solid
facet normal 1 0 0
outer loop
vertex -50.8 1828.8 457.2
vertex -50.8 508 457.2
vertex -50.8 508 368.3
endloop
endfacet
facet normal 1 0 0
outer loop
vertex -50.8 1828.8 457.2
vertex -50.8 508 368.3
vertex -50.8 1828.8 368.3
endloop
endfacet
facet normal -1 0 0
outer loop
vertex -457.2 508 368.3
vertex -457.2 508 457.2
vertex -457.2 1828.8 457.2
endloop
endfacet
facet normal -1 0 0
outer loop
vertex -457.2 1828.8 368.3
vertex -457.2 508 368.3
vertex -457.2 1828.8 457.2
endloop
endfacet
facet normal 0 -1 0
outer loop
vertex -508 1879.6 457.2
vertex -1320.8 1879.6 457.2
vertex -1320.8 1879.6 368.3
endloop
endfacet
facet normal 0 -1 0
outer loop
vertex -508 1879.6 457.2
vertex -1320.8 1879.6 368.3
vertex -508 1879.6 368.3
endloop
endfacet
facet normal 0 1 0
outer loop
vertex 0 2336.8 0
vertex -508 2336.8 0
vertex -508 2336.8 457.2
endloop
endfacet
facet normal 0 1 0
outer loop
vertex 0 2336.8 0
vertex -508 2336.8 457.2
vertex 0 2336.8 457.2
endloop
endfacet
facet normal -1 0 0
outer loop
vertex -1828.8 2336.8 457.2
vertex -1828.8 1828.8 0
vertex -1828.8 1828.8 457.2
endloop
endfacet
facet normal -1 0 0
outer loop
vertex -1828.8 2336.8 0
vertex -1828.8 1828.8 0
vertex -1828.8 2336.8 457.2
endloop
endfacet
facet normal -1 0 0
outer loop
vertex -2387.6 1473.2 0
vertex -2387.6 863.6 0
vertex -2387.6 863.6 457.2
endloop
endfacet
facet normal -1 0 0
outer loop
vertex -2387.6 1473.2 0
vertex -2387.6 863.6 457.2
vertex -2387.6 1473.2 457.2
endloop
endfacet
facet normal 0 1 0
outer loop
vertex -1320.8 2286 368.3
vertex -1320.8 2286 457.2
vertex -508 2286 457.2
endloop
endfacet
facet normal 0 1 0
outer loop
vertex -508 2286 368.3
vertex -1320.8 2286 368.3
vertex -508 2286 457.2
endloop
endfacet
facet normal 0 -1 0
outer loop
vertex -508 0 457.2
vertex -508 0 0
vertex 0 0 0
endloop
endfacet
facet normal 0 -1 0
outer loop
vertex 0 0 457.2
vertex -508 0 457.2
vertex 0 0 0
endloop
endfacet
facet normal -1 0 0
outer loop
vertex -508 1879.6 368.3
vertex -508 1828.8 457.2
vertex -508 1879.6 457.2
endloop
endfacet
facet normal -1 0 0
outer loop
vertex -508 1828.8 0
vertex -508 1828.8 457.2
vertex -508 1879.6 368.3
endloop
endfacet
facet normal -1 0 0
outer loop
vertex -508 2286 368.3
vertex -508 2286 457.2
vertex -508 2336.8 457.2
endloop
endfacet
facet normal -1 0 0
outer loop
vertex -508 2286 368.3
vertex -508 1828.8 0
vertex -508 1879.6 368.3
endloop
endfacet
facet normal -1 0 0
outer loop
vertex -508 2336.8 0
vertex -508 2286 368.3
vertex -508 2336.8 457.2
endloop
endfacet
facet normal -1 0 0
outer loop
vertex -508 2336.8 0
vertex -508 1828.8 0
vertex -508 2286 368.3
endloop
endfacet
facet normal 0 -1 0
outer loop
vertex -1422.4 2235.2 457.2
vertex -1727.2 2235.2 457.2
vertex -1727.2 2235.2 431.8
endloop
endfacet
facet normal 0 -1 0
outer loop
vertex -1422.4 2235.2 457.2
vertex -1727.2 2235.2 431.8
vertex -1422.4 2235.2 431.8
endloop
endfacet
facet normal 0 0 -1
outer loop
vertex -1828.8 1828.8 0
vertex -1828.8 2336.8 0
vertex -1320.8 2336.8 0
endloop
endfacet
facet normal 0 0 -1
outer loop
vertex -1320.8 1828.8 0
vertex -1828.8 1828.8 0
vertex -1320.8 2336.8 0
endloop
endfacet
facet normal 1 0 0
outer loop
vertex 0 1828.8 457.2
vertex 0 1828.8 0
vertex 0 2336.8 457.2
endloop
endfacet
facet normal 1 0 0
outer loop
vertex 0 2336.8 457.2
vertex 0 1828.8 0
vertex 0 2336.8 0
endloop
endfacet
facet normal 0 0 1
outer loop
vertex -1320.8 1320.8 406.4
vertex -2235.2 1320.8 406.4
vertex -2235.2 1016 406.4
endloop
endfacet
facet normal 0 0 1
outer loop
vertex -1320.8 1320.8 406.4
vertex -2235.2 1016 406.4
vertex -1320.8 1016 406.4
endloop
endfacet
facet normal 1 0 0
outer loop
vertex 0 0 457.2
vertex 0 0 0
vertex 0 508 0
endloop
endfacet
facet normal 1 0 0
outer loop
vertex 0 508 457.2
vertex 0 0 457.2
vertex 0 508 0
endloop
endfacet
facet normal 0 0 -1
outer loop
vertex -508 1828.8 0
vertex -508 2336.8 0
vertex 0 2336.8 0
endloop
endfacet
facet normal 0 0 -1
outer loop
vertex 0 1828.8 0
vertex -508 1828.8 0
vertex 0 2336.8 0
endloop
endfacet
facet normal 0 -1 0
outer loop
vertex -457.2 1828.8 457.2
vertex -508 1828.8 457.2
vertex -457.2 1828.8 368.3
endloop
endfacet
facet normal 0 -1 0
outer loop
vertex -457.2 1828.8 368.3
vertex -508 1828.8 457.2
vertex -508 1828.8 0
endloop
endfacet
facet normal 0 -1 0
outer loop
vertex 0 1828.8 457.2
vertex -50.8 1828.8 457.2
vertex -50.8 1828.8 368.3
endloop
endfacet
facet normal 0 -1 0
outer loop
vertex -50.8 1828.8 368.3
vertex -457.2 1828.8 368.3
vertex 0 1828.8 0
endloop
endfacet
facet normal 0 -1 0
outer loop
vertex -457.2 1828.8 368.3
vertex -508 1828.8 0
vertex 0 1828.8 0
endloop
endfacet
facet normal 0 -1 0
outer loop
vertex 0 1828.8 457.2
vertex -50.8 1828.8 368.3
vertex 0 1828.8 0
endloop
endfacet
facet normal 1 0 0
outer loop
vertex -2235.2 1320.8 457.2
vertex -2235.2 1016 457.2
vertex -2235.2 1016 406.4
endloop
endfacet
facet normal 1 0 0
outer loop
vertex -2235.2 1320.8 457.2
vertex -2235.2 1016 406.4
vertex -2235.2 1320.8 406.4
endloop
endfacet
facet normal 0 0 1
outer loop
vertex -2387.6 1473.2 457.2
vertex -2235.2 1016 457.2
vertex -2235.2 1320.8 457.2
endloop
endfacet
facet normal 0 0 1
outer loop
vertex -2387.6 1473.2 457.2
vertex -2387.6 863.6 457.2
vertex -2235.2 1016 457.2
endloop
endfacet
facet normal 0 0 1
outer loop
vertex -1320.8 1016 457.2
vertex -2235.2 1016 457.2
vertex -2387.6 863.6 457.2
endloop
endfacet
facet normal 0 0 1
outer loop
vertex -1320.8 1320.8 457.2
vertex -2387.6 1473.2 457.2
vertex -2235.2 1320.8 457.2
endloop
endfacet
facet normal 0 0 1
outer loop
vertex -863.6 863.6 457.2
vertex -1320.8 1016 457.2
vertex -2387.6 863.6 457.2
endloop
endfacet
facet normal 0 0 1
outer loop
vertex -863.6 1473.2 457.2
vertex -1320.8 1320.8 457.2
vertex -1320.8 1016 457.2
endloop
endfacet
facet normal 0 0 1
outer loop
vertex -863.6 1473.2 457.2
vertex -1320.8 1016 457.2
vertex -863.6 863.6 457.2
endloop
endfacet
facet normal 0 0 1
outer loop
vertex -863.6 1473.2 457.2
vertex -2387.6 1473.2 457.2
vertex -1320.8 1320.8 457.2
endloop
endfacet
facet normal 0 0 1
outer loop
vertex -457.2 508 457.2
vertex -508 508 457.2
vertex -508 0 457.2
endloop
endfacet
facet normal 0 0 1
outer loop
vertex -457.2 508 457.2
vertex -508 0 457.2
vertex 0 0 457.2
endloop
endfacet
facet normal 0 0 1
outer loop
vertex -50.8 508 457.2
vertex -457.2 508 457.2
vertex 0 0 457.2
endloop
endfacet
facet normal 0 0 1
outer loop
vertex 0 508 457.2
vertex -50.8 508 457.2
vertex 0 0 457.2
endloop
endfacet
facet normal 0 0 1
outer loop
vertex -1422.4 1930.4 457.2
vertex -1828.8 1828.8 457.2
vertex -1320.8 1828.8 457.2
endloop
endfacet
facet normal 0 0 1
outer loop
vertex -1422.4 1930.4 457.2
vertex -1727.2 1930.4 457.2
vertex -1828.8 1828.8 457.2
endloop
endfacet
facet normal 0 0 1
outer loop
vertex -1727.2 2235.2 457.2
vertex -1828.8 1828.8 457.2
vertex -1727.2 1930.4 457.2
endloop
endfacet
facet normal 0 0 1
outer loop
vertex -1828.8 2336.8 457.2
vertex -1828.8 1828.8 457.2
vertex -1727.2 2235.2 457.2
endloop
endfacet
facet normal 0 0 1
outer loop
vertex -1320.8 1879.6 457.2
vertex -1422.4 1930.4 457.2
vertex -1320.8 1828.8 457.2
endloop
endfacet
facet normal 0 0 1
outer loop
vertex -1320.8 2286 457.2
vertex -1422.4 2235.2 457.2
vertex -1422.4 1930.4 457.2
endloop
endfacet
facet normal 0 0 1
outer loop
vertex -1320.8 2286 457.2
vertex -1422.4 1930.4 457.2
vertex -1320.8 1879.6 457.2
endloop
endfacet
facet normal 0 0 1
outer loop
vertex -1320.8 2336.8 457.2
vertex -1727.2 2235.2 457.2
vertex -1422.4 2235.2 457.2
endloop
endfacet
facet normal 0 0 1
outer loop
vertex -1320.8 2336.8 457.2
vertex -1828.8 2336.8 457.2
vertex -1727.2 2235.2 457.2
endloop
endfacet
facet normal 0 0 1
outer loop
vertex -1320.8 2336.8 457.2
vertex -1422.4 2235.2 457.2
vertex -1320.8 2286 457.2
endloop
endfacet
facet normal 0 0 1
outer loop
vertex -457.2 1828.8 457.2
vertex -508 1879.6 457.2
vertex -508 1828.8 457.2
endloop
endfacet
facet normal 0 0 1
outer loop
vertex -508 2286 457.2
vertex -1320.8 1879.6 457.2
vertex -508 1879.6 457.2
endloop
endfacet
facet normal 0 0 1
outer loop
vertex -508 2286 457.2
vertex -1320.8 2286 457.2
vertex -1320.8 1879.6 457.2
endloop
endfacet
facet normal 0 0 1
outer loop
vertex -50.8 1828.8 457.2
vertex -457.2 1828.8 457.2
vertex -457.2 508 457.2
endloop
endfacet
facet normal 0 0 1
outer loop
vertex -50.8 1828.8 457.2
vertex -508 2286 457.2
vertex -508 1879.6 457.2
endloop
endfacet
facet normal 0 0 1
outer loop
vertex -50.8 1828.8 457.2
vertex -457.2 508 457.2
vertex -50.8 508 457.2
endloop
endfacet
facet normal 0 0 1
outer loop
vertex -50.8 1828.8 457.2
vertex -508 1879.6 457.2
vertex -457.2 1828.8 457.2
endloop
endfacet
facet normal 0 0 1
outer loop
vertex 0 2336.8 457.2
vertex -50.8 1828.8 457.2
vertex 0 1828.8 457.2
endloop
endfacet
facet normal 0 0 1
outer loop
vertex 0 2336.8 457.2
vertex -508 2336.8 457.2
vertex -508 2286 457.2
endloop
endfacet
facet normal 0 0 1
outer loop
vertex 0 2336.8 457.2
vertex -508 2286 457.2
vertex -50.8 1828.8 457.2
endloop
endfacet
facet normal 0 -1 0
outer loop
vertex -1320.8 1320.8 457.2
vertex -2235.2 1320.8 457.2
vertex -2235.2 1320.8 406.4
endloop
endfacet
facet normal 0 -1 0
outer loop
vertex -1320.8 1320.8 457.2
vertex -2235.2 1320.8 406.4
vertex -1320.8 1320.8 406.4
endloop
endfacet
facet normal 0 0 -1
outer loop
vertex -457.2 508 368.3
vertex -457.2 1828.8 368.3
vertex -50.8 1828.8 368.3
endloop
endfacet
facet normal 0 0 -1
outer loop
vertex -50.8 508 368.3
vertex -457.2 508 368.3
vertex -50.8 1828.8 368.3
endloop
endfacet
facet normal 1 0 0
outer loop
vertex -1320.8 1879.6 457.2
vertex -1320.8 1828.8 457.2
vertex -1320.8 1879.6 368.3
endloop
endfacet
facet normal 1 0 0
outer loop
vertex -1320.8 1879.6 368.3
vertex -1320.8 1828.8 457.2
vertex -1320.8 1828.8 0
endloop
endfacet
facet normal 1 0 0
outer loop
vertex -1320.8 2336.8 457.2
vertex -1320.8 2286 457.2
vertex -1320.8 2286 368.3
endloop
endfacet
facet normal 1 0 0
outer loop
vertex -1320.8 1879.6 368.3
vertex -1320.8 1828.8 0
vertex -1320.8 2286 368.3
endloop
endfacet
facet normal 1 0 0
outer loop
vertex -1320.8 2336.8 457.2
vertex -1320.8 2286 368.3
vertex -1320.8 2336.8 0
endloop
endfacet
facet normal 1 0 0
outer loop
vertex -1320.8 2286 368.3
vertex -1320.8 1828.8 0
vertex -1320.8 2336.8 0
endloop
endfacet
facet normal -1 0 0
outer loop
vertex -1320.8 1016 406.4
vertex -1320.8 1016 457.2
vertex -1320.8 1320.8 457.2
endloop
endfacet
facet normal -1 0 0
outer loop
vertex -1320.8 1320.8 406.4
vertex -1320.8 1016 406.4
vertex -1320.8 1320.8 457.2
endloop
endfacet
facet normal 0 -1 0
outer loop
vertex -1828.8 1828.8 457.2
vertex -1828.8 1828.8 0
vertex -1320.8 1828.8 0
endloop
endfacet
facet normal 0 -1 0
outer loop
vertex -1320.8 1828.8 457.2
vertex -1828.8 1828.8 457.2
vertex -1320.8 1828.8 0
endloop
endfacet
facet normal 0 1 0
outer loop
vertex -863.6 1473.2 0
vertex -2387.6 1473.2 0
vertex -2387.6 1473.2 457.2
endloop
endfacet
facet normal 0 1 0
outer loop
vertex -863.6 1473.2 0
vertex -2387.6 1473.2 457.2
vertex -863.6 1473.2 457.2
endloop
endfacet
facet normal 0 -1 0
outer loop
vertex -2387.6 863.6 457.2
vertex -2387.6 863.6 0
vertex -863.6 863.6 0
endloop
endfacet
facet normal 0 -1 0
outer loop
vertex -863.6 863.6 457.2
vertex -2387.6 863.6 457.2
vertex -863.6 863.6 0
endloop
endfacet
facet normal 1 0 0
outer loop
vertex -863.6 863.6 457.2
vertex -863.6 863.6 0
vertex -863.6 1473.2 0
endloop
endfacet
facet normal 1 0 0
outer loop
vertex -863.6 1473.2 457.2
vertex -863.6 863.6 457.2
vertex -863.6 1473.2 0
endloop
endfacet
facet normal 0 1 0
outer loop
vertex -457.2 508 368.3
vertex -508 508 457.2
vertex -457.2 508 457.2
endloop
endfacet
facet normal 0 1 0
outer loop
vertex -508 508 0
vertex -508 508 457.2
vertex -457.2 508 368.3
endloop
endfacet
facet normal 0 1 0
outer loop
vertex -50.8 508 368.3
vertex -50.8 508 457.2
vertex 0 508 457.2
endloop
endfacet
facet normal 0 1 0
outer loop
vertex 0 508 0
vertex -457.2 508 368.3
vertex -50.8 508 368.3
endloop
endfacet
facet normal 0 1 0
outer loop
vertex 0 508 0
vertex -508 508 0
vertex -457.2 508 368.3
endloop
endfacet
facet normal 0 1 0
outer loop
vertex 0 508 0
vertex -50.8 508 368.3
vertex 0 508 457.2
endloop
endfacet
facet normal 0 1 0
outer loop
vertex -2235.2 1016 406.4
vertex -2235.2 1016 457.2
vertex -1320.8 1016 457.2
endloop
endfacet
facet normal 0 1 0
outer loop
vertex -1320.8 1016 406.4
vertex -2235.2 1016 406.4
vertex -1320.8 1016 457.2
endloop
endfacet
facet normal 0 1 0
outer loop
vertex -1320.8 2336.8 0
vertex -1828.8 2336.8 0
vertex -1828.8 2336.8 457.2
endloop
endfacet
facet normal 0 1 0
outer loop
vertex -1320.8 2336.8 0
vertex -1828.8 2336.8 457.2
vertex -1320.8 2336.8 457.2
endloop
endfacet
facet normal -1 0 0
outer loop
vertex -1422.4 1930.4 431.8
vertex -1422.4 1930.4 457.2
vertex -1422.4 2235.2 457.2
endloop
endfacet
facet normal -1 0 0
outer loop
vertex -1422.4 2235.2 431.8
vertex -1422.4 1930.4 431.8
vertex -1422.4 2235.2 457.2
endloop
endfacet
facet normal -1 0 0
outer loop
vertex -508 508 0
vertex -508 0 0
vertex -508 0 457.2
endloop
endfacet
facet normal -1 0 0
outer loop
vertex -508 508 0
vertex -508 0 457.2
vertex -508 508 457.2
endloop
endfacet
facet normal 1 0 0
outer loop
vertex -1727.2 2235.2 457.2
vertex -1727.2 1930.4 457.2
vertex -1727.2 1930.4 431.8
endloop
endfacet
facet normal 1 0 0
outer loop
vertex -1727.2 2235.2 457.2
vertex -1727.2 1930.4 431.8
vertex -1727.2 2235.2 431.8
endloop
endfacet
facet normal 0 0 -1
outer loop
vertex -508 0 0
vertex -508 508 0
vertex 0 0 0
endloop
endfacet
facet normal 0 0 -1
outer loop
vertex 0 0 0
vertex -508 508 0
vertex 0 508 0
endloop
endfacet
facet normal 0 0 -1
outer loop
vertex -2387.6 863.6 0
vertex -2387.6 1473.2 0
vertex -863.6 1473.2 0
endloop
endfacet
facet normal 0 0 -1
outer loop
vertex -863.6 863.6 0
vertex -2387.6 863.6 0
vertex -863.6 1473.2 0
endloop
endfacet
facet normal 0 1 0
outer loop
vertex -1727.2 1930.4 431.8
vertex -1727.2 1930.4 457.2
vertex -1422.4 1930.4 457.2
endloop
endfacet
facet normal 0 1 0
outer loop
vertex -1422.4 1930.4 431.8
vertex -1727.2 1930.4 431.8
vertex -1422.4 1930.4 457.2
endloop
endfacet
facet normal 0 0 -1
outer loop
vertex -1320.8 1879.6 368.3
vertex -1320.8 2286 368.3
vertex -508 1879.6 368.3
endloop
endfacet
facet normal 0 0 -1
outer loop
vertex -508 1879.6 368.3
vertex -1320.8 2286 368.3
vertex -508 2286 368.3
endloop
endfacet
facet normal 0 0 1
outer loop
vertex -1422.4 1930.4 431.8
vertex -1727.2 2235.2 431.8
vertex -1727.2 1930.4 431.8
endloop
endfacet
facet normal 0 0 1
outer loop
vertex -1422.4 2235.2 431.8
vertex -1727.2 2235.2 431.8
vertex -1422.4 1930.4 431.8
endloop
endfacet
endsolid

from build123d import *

# Parameters (mm, degrees)
F0_W     = 508
F0_H     = 508
F0_W_2   = 1524
F0_H_2   = 609.6
F1_DEPTH = 457.2
F2_W     = 406.4
F2_H     = 1371.6
F2_W_2   = 914.4
F2_H_2   = 406.4
F3_DEPTH = 88.9
F2_W_3   = 304.8
F2_H_3   = 304.8
F4_DEPTH = 25.4
F5_DEPTH = 50.8


with BuildPart() as f1:
    # F0 (on Top) → F1 (new body)
    with BuildSketch(Plane.XY):
        with Locations((-254, 254)):
            Rectangle(F0_W, F0_H)
        with Locations((-254, 2082.8)):
            Rectangle(F0_W, F0_H)
        with Locations((-1574.8, 2082.8)):
            Rectangle(F0_W, F0_H)
        with Locations((-1625.6, 1168.4)):
            Rectangle(F0_W_2, F0_H_2)
    extrude(amount=F1_DEPTH)

    # F2 (on face) → F3 (join)
    with BuildSketch(Plane.XY.offset(457.2)):
        with Locations((-254, 1193.8)):
            Rectangle(F2_W, F2_H)
        with Locations((-914.4, 2082.8)):
            Rectangle(F2_W_2, F2_H_2)
    extrude(amount=-F3_DEPTH)

    # F2 (on face) → F4 (cut)
    with BuildSketch(Plane.XY.offset(457.2)):
        with Locations((-1574.8, 2082.8)):
            Rectangle(F2_W_3, F2_H_3)
    extrude(amount=-F4_DEPTH, mode=Mode.SUBTRACT)

    # F2 (on face) → F5 (cut)
    with BuildSketch(Plane.XY.offset(457.2)):
        with Locations((-1778, 1168.4)):
            Rectangle(F2_W_2, F2_H_3)
    extrude(amount=-F5_DEPTH, mode=Mode.SUBTRACT)


solid = f1.part
